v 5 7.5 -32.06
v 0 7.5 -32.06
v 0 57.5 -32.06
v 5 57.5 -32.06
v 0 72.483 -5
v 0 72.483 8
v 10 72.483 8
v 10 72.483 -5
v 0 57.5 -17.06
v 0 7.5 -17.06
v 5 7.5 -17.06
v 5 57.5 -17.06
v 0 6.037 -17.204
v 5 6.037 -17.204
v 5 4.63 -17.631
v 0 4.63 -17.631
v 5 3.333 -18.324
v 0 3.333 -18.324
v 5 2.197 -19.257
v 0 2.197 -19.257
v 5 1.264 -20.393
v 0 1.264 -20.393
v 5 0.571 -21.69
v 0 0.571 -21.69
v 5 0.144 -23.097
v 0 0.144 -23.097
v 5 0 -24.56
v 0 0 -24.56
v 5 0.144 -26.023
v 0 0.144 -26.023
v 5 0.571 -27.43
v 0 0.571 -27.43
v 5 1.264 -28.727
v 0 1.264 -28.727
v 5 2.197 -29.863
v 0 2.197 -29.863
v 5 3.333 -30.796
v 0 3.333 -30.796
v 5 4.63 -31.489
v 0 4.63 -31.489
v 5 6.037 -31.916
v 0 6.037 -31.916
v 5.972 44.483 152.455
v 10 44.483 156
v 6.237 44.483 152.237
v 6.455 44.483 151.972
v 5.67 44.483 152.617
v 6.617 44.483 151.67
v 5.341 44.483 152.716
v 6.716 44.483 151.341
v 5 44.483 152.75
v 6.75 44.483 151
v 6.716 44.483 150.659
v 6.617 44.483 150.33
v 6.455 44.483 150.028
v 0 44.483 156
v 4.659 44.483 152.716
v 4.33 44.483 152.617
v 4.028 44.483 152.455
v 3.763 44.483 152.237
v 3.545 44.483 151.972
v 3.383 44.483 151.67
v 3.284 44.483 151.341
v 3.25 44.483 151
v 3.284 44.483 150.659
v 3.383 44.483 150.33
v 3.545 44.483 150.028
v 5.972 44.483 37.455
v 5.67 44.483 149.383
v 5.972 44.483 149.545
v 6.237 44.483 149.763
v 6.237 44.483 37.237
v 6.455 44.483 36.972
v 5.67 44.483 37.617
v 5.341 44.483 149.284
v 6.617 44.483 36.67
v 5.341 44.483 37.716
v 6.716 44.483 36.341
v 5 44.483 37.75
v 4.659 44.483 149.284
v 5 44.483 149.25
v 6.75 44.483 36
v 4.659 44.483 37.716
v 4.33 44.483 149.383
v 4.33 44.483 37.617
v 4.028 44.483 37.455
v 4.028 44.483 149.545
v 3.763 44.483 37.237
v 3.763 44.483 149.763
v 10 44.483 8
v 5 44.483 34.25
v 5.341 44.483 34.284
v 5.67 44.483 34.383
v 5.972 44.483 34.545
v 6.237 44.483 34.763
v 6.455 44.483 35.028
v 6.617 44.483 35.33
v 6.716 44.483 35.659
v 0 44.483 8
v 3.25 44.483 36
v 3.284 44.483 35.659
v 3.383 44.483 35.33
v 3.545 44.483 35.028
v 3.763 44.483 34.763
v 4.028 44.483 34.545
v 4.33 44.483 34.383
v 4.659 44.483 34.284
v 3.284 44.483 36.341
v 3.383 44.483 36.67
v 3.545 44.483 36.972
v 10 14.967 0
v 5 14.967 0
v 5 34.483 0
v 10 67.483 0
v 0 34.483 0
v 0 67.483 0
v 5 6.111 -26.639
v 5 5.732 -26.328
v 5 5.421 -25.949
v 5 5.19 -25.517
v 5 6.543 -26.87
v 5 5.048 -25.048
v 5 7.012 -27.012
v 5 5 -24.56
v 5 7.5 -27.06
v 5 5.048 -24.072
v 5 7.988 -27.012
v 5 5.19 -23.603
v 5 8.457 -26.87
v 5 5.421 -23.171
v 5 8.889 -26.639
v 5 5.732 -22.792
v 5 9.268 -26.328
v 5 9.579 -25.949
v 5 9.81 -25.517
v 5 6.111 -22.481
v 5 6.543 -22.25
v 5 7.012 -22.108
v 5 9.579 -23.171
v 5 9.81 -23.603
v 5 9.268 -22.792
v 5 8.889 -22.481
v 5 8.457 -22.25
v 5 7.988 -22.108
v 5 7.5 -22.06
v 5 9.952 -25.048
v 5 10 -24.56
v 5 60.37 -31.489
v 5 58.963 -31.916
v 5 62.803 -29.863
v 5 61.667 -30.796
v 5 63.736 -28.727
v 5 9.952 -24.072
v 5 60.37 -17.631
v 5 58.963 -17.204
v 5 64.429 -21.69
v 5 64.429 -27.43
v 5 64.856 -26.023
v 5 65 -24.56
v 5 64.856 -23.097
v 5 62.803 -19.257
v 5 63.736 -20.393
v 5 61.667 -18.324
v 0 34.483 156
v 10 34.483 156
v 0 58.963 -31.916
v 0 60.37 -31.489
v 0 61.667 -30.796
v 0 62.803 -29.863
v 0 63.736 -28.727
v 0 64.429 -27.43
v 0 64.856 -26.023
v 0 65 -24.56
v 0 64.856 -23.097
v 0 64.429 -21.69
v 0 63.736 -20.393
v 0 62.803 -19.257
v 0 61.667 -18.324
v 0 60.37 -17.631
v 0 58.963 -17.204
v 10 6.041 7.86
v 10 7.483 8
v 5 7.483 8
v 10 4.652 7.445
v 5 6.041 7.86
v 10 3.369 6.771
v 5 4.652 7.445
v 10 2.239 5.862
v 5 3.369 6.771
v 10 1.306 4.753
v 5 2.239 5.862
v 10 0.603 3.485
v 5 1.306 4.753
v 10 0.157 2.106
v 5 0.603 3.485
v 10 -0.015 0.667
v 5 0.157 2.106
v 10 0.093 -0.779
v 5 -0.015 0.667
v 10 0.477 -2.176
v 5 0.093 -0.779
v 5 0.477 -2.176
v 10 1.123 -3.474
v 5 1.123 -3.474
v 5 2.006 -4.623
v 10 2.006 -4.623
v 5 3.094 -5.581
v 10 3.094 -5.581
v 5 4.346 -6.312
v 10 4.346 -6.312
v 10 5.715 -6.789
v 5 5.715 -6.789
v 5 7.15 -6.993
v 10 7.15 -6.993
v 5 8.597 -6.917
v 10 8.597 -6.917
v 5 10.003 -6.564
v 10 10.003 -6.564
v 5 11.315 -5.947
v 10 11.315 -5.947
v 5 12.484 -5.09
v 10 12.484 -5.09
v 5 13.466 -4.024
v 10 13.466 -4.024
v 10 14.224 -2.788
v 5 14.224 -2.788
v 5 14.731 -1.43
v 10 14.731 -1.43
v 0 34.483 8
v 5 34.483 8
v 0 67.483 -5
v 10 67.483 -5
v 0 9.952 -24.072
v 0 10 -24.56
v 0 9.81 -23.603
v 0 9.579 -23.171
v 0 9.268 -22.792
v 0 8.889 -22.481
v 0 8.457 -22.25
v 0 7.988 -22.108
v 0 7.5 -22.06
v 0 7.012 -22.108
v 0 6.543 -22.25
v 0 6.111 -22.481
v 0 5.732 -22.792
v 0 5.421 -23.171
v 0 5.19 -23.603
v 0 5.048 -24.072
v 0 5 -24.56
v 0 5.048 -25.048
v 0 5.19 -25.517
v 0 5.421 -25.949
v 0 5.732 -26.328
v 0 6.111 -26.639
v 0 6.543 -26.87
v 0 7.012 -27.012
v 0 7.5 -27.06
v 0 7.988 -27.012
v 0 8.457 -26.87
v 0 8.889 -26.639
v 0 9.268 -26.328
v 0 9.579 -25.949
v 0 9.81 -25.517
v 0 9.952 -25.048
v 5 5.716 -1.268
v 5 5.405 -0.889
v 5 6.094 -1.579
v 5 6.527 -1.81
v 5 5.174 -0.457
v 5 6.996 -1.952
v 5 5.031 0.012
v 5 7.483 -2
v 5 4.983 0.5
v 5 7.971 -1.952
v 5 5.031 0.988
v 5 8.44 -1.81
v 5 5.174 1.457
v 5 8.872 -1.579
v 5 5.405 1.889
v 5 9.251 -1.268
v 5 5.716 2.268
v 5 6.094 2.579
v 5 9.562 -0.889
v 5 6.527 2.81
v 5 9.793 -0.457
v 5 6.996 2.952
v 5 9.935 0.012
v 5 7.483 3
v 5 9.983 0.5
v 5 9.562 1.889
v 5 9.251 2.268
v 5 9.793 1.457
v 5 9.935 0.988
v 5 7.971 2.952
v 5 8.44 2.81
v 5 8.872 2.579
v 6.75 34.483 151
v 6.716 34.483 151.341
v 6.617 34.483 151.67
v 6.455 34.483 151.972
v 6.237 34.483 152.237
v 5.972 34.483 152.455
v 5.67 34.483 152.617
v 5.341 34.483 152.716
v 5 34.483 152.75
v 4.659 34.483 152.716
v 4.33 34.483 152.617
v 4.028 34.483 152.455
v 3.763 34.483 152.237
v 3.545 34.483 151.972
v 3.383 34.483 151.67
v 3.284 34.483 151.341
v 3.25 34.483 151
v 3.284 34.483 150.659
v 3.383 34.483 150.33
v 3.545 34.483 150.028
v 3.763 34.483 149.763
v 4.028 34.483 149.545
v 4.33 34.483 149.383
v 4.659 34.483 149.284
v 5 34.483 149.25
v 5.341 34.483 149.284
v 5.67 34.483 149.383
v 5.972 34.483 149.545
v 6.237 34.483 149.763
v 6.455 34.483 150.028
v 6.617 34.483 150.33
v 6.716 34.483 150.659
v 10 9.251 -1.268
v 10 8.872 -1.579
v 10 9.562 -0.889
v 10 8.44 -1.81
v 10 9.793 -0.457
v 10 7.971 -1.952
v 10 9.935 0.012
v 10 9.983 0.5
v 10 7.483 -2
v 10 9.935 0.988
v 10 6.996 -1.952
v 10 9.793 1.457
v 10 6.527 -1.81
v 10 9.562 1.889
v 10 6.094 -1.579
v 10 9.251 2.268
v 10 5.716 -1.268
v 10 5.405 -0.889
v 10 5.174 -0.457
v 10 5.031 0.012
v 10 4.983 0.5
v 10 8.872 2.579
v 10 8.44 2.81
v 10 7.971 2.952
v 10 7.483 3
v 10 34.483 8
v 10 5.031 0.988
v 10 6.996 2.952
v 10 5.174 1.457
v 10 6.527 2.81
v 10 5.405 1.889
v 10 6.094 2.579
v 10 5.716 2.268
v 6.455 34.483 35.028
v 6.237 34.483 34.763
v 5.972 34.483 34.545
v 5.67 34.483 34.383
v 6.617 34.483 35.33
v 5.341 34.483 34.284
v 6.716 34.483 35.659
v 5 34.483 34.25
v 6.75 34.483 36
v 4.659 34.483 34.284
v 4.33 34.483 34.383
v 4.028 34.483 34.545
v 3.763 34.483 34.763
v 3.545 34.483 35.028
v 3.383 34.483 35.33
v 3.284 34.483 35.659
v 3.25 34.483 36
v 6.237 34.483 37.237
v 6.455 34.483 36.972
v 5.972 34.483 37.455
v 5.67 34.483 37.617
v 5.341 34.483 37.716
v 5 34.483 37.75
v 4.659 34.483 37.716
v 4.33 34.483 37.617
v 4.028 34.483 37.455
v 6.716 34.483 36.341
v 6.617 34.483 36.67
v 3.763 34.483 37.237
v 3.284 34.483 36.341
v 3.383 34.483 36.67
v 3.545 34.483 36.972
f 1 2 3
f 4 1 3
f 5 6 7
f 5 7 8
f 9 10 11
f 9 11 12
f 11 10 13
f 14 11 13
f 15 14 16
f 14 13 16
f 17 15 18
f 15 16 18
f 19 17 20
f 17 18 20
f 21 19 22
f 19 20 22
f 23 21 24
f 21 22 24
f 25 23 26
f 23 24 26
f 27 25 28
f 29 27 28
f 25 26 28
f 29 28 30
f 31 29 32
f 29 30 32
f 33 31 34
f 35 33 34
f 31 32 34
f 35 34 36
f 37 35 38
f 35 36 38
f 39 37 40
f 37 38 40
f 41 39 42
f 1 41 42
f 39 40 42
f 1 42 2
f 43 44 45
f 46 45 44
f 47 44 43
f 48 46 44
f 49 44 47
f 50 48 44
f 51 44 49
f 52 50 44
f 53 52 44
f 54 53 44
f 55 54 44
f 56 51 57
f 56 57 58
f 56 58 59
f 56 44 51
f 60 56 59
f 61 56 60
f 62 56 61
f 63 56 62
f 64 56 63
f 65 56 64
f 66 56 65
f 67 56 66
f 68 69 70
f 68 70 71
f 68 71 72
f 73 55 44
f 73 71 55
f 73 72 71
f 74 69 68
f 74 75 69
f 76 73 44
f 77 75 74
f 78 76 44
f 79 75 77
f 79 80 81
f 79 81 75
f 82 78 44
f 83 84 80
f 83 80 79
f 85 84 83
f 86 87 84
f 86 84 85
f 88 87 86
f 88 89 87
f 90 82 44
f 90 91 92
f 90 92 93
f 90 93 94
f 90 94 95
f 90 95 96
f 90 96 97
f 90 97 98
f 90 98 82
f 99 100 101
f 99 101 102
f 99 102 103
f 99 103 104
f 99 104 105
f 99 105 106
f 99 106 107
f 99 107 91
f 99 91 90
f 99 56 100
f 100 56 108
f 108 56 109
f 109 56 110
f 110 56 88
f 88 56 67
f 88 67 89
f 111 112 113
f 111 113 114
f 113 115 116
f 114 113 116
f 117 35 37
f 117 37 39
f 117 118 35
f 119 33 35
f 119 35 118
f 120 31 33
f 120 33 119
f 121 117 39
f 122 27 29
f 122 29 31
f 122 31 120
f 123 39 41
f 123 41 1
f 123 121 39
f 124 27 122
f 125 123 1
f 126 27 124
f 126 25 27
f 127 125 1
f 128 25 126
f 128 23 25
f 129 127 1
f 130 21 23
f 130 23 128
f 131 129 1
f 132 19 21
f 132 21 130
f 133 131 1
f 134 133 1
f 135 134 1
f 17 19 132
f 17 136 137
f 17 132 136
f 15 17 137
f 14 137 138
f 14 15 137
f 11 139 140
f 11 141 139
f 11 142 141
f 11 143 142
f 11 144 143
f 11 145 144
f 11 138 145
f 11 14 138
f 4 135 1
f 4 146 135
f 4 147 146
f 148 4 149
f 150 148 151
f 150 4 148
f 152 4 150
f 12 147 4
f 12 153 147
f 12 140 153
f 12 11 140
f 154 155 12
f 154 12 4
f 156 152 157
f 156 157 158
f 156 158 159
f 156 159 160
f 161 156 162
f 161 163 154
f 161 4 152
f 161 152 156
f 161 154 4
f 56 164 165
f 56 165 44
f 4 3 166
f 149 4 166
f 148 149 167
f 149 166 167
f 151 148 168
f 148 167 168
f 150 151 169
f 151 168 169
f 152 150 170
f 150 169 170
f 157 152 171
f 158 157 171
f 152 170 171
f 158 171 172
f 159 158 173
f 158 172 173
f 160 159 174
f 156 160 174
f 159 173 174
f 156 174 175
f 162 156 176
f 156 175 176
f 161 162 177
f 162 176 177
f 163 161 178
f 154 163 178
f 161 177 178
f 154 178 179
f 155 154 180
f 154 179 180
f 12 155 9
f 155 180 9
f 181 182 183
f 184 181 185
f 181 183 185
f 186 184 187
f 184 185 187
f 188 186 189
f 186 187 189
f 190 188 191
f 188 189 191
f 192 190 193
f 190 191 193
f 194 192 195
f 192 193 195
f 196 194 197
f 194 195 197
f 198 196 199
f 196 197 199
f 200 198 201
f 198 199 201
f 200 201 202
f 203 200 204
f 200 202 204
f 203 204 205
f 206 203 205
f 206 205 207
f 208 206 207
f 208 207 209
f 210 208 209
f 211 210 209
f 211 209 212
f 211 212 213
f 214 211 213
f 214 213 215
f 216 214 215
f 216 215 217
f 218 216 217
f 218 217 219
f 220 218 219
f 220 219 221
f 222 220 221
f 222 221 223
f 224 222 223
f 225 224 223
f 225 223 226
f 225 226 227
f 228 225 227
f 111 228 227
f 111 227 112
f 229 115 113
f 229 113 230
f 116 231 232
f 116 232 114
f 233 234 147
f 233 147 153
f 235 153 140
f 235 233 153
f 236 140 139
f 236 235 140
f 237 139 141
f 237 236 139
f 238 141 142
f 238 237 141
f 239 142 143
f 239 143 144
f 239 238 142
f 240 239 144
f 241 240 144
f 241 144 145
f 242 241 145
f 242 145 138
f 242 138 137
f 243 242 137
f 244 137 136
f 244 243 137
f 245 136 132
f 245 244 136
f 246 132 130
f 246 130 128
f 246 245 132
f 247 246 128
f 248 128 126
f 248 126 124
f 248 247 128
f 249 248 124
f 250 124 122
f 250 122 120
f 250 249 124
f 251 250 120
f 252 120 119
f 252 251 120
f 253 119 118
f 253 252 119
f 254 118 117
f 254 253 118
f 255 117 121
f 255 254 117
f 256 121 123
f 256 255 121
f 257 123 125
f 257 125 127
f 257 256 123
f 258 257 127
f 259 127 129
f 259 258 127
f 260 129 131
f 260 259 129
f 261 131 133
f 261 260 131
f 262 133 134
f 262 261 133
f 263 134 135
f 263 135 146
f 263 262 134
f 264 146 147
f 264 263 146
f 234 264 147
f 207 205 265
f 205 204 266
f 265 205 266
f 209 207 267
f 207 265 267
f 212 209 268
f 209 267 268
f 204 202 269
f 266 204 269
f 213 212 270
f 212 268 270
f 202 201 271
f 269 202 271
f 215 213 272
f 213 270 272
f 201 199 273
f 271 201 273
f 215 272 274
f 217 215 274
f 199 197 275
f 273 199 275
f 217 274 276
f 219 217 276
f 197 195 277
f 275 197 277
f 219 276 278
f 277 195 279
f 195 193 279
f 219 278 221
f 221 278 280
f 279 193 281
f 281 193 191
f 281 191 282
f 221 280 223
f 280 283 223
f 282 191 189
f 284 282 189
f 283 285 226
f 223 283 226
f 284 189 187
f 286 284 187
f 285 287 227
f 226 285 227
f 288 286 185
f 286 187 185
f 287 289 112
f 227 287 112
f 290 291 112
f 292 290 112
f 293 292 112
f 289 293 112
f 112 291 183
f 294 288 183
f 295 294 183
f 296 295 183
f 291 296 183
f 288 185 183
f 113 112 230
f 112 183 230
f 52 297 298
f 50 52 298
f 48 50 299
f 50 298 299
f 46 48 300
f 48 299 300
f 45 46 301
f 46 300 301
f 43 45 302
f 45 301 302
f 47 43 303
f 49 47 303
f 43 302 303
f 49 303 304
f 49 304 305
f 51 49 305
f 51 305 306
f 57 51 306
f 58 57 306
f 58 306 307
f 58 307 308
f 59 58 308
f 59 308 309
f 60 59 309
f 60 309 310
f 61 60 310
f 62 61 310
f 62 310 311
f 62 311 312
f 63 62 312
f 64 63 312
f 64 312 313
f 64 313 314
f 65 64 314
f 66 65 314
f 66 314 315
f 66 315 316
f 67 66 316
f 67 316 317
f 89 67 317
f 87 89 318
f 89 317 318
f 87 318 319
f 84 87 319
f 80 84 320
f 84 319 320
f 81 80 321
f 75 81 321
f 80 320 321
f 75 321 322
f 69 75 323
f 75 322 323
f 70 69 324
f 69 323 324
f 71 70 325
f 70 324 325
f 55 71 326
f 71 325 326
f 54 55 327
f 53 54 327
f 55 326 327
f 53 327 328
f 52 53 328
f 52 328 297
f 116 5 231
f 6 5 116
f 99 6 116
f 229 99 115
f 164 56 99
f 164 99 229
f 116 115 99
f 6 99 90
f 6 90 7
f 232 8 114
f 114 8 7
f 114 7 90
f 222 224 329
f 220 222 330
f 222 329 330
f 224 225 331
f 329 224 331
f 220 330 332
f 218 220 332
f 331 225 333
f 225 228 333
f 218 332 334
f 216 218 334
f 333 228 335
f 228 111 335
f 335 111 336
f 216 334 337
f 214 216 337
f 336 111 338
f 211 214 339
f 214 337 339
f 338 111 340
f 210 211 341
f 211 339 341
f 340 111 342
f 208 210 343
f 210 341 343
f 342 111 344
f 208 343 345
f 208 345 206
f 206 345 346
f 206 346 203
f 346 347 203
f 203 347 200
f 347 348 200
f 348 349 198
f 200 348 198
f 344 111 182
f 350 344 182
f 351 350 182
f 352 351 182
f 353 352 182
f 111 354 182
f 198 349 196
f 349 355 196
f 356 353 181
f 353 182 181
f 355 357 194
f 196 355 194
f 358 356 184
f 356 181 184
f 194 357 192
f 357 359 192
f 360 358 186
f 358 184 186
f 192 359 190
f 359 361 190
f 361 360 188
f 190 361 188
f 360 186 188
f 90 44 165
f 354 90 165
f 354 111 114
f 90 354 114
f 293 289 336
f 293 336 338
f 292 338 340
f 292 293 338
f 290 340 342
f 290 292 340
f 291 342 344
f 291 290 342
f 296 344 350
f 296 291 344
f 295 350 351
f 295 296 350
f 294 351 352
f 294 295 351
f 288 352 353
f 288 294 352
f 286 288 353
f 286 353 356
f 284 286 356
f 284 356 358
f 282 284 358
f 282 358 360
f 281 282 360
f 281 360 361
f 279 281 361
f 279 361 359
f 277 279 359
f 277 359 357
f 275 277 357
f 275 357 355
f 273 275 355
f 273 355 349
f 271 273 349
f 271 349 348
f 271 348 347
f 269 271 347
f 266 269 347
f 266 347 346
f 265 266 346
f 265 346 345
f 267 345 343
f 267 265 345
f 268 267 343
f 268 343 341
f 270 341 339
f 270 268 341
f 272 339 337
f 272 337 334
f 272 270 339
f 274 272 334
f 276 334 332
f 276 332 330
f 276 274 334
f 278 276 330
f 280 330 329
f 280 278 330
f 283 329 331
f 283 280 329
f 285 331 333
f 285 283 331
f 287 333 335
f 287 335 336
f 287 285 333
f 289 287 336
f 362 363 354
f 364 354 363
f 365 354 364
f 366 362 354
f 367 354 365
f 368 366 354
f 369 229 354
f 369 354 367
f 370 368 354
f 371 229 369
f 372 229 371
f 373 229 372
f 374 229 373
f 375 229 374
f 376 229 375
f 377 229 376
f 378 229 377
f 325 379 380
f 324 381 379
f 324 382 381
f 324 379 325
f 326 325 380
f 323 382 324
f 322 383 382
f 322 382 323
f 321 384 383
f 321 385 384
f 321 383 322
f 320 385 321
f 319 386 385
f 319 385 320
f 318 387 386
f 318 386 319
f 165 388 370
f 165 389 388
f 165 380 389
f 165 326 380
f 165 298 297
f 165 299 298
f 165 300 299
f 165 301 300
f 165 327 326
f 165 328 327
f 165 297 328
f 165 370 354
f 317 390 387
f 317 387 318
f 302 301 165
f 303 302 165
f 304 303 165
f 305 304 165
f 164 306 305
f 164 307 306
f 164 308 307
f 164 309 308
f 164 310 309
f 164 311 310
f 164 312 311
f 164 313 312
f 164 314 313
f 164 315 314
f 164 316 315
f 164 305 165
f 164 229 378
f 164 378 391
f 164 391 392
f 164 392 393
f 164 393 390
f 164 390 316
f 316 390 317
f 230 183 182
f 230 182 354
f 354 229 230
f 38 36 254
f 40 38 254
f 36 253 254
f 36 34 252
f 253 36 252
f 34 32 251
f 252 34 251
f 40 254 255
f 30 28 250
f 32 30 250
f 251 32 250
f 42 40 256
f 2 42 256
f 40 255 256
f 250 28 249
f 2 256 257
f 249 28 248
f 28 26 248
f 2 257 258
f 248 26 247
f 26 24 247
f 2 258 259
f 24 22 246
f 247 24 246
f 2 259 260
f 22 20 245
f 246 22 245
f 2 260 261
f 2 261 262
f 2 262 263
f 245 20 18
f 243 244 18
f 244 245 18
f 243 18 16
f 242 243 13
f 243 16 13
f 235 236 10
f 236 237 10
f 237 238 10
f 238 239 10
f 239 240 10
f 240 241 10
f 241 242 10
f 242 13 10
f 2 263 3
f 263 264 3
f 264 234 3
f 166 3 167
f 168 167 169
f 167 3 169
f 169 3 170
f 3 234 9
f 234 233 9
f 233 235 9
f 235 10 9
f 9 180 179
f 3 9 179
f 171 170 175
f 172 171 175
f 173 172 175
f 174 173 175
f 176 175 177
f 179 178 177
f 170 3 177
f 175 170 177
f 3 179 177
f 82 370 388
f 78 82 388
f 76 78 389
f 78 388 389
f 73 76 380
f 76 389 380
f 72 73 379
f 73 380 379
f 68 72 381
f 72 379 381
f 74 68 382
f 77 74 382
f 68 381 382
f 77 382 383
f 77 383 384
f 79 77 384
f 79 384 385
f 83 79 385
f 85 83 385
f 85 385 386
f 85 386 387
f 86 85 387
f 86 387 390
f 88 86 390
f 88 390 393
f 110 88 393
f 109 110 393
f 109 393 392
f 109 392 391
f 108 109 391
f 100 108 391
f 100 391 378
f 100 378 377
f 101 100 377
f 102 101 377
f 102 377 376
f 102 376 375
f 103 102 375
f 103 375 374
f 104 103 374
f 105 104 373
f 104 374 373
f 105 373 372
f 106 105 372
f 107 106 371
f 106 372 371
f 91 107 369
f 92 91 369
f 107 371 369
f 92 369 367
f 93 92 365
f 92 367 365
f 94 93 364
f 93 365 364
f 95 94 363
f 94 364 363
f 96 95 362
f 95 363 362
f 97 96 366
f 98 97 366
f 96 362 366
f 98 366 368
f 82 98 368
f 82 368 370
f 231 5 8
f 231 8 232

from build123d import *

# Parameters (mm, degrees)
SKETCH_R        = 2.5
PAD_DEPTH       = 10
SKETCH001_W     = 54.878879
SKETCH001_H     = 28.603614
POCKET_DEPTH    = 5
SKETCH002_R     = 1.75
POCKET001_DEPTH = 100
SKETCH003_R     = 2.5
PAD001_DEPTH    = 5


with BuildPart() as st_tze:
    # Sketch → Pad (new body)
    with BuildSketch(Plane.YZ):
        with BuildLine():
            Line((34.483315, 156), (44.483315, 156))
            Line((44.483315, 156), (44.483315, 8))
            Line((44.483315, 8), (72.483315, 8))
            Line((72.483315, 8), (72.483315, -5))
            Line((72.483315, -5), (67.483315, -5))
            Line((67.483315, -5), (67.483315, 0))
            Line((14.96663, 0), (67.483315, 0))
            ThreePointArc((7.483315, 8), (2.006089, -4.623475), (14.96663, 0))
            Line((7.483315, 8), (34.483315, 8))
            Line((34.483315, 8), (34.483315, 156))
        make_face()
        with Locations((7.483315, 0.5)):
            Circle(SKETCH_R, mode=Mode.SUBTRACT)
    extrude(amount=PAD_DEPTH)

    # Sketch001 → Pocket (cut)
    with BuildSketch(Plane.YZ):
        with Locations((7.043875, 0.484823)):
            Rectangle(SKETCH001_W, SKETCH001_H)
    extrude(amount=POCKET_DEPTH, mode=Mode.SUBTRACT)

    # Sketch002 → Pocket001 (cut)
    with BuildSketch(Plane.XZ):
        with Locations((5, 151)):
            Circle(SKETCH002_R)
        with Locations((5, 36)):
            Circle(SKETCH002_R)
    extrude(amount=-POCKET001_DEPTH, mode=Mode.SUBTRACT)


with BuildPart() as beinchen:
    # Sketch003 → Pad001 (new body)
    with BuildSketch(Plane.YZ):
        with BuildLine():
            ThreePointArc((7.5, -17.060146), (0, -24.560146), (7.5, -32.060146))
            Line((7.5, -32.060146), (57.5, -32.060146))
            ThreePointArc((57.5, -32.060146), (65, -24.560146), (57.5, -17.060146))
            Line((7.5, -17.060146), (57.5, -17.060146))
        make_face()
        with Locations((7.5, -24.560146)):
            Circle(SKETCH003_R, mode=Mode.SUBTRACT)
    extrude(amount=PAD001_DEPTH)


solid = Compound([st_tze.part, beinchen.part])
